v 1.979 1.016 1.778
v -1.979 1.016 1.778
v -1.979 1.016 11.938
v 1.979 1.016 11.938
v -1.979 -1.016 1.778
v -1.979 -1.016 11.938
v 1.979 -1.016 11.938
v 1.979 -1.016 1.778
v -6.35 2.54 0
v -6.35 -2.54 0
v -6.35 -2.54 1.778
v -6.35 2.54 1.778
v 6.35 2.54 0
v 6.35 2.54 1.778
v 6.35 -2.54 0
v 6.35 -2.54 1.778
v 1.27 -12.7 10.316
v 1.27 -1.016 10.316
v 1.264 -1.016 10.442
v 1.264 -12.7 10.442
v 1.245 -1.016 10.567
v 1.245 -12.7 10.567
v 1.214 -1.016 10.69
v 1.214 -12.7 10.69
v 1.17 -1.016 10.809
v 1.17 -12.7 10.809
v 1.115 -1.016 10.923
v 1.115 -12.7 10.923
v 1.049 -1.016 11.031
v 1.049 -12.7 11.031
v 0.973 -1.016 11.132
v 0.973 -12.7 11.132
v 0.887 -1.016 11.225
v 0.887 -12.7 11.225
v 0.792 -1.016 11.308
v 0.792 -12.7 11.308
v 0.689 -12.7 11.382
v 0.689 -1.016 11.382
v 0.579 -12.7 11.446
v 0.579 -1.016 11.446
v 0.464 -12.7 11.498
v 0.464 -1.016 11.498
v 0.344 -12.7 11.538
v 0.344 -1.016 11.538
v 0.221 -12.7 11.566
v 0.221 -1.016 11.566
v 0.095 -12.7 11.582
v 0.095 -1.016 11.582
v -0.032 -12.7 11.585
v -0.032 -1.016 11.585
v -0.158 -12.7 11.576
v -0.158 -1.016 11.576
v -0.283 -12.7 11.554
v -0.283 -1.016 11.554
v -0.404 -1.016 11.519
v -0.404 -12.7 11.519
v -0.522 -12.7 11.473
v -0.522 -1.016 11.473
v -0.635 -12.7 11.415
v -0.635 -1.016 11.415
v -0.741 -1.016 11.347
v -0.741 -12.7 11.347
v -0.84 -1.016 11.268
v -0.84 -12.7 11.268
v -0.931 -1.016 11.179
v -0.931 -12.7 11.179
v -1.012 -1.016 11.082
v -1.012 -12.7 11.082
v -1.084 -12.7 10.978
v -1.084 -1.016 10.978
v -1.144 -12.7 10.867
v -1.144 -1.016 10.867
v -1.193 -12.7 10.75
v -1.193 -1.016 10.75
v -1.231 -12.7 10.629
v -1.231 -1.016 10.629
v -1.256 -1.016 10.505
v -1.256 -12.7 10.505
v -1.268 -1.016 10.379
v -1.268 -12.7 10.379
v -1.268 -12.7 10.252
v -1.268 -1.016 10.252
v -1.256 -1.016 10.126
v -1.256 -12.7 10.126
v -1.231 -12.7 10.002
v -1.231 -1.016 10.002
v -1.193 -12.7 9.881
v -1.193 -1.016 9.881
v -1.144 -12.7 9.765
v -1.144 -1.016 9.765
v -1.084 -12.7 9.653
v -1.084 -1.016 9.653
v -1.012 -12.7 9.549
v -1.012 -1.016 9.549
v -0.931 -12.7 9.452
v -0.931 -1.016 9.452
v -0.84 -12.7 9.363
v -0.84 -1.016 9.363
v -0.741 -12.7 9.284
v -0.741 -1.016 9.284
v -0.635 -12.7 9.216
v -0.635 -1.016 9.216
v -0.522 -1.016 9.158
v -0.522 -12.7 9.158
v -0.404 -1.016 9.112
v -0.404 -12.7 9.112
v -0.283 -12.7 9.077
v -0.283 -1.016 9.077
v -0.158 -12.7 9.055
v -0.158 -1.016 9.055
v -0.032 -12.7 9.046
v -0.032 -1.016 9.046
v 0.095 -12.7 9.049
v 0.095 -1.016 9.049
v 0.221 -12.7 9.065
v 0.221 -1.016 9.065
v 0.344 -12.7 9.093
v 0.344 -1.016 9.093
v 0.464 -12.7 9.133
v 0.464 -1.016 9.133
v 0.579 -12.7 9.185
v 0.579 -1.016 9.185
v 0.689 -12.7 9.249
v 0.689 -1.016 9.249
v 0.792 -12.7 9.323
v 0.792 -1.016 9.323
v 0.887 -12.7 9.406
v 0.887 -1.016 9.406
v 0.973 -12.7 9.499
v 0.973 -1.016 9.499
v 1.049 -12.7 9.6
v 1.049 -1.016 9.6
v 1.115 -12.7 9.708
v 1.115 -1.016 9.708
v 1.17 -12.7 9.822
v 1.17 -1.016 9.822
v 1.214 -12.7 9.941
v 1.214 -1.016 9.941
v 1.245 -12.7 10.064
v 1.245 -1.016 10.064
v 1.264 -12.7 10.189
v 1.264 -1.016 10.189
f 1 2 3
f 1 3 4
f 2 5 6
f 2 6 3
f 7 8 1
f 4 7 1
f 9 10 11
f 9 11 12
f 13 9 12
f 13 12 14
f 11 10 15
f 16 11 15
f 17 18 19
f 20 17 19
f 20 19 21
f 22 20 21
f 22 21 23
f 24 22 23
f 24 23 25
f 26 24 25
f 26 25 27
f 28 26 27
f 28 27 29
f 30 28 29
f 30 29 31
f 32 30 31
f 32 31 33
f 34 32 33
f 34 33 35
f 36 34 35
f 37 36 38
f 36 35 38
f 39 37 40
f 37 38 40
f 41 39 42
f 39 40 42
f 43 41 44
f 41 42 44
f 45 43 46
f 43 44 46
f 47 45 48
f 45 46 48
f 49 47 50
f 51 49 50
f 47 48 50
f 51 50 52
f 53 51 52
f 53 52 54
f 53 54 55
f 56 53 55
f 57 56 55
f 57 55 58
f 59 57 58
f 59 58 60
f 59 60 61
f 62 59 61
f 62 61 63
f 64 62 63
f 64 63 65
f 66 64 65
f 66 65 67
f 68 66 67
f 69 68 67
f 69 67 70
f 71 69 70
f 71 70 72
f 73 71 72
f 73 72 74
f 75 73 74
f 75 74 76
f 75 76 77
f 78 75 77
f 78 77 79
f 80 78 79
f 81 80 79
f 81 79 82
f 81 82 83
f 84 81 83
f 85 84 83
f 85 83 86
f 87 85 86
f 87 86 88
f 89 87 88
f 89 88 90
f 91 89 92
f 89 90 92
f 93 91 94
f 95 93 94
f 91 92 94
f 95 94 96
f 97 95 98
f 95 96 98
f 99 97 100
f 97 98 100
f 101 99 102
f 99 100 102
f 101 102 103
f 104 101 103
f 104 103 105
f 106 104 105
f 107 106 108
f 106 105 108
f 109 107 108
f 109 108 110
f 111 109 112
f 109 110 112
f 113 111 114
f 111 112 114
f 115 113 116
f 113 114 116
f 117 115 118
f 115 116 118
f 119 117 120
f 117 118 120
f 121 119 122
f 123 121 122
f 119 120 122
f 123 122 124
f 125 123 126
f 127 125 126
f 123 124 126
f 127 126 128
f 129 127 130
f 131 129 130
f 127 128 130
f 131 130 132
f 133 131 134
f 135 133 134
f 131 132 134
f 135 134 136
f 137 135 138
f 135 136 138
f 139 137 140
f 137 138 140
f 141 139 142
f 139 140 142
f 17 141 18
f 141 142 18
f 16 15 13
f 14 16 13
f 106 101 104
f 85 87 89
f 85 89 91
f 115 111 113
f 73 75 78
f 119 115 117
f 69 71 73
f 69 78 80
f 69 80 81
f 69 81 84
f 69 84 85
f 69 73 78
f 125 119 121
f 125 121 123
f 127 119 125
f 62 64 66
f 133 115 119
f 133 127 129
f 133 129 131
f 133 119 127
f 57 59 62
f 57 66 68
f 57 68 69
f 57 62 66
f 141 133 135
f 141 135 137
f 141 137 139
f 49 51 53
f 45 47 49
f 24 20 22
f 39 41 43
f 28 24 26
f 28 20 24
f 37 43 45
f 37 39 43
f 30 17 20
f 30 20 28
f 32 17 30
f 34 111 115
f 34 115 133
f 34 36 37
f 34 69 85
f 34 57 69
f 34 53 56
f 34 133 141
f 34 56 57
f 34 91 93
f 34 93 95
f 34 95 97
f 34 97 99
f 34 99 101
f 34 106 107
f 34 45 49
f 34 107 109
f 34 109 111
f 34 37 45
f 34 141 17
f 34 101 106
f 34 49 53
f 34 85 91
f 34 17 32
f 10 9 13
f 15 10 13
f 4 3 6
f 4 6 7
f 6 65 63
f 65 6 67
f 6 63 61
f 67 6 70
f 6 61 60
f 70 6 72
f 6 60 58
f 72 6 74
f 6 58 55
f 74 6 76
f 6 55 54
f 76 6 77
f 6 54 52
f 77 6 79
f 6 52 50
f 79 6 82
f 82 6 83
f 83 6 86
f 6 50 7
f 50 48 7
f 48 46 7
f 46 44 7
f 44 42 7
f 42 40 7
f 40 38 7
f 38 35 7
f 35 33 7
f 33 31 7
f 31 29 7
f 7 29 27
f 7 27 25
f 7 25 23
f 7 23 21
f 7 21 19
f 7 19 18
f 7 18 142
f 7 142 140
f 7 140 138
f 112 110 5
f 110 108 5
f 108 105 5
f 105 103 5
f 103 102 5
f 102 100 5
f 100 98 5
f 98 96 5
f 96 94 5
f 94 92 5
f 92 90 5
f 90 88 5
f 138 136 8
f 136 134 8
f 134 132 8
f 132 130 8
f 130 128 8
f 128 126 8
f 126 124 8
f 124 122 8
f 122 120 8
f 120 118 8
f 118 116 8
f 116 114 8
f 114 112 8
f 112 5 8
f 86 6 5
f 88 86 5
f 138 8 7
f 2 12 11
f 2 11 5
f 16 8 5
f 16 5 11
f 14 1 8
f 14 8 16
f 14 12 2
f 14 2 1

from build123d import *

# Parameters (mm, degrees)
F0_W     = 12.7
F0_H     = 5.08
F1_DEPTH = 1.778
F3_W     = 3.957054
F3_H     = 2.032
F4_DEPTH = 10.16
F5_R     = 1.27
F6_DEPTH = 12.7


with BuildPart() as f1:
    # F0 (on Top) → F1 (new body)
    with BuildSketch(Plane.XY):
        Rectangle(F0_W, F0_H)
    extrude(amount=F1_DEPTH)

    # F3 (on offset) → F4 (join)
    with BuildSketch(Plane.XY.offset(1.778)):
        Rectangle(F3_W, F3_H)
    extrude(amount=F4_DEPTH)

    # F5 (on Front) → F6 (join)
    with BuildSketch(Plane.XZ):
        with Locations((0, 10.315562)):
            Circle(F5_R)
    extrude(amount=F6_DEPTH)


solid = f1.part
